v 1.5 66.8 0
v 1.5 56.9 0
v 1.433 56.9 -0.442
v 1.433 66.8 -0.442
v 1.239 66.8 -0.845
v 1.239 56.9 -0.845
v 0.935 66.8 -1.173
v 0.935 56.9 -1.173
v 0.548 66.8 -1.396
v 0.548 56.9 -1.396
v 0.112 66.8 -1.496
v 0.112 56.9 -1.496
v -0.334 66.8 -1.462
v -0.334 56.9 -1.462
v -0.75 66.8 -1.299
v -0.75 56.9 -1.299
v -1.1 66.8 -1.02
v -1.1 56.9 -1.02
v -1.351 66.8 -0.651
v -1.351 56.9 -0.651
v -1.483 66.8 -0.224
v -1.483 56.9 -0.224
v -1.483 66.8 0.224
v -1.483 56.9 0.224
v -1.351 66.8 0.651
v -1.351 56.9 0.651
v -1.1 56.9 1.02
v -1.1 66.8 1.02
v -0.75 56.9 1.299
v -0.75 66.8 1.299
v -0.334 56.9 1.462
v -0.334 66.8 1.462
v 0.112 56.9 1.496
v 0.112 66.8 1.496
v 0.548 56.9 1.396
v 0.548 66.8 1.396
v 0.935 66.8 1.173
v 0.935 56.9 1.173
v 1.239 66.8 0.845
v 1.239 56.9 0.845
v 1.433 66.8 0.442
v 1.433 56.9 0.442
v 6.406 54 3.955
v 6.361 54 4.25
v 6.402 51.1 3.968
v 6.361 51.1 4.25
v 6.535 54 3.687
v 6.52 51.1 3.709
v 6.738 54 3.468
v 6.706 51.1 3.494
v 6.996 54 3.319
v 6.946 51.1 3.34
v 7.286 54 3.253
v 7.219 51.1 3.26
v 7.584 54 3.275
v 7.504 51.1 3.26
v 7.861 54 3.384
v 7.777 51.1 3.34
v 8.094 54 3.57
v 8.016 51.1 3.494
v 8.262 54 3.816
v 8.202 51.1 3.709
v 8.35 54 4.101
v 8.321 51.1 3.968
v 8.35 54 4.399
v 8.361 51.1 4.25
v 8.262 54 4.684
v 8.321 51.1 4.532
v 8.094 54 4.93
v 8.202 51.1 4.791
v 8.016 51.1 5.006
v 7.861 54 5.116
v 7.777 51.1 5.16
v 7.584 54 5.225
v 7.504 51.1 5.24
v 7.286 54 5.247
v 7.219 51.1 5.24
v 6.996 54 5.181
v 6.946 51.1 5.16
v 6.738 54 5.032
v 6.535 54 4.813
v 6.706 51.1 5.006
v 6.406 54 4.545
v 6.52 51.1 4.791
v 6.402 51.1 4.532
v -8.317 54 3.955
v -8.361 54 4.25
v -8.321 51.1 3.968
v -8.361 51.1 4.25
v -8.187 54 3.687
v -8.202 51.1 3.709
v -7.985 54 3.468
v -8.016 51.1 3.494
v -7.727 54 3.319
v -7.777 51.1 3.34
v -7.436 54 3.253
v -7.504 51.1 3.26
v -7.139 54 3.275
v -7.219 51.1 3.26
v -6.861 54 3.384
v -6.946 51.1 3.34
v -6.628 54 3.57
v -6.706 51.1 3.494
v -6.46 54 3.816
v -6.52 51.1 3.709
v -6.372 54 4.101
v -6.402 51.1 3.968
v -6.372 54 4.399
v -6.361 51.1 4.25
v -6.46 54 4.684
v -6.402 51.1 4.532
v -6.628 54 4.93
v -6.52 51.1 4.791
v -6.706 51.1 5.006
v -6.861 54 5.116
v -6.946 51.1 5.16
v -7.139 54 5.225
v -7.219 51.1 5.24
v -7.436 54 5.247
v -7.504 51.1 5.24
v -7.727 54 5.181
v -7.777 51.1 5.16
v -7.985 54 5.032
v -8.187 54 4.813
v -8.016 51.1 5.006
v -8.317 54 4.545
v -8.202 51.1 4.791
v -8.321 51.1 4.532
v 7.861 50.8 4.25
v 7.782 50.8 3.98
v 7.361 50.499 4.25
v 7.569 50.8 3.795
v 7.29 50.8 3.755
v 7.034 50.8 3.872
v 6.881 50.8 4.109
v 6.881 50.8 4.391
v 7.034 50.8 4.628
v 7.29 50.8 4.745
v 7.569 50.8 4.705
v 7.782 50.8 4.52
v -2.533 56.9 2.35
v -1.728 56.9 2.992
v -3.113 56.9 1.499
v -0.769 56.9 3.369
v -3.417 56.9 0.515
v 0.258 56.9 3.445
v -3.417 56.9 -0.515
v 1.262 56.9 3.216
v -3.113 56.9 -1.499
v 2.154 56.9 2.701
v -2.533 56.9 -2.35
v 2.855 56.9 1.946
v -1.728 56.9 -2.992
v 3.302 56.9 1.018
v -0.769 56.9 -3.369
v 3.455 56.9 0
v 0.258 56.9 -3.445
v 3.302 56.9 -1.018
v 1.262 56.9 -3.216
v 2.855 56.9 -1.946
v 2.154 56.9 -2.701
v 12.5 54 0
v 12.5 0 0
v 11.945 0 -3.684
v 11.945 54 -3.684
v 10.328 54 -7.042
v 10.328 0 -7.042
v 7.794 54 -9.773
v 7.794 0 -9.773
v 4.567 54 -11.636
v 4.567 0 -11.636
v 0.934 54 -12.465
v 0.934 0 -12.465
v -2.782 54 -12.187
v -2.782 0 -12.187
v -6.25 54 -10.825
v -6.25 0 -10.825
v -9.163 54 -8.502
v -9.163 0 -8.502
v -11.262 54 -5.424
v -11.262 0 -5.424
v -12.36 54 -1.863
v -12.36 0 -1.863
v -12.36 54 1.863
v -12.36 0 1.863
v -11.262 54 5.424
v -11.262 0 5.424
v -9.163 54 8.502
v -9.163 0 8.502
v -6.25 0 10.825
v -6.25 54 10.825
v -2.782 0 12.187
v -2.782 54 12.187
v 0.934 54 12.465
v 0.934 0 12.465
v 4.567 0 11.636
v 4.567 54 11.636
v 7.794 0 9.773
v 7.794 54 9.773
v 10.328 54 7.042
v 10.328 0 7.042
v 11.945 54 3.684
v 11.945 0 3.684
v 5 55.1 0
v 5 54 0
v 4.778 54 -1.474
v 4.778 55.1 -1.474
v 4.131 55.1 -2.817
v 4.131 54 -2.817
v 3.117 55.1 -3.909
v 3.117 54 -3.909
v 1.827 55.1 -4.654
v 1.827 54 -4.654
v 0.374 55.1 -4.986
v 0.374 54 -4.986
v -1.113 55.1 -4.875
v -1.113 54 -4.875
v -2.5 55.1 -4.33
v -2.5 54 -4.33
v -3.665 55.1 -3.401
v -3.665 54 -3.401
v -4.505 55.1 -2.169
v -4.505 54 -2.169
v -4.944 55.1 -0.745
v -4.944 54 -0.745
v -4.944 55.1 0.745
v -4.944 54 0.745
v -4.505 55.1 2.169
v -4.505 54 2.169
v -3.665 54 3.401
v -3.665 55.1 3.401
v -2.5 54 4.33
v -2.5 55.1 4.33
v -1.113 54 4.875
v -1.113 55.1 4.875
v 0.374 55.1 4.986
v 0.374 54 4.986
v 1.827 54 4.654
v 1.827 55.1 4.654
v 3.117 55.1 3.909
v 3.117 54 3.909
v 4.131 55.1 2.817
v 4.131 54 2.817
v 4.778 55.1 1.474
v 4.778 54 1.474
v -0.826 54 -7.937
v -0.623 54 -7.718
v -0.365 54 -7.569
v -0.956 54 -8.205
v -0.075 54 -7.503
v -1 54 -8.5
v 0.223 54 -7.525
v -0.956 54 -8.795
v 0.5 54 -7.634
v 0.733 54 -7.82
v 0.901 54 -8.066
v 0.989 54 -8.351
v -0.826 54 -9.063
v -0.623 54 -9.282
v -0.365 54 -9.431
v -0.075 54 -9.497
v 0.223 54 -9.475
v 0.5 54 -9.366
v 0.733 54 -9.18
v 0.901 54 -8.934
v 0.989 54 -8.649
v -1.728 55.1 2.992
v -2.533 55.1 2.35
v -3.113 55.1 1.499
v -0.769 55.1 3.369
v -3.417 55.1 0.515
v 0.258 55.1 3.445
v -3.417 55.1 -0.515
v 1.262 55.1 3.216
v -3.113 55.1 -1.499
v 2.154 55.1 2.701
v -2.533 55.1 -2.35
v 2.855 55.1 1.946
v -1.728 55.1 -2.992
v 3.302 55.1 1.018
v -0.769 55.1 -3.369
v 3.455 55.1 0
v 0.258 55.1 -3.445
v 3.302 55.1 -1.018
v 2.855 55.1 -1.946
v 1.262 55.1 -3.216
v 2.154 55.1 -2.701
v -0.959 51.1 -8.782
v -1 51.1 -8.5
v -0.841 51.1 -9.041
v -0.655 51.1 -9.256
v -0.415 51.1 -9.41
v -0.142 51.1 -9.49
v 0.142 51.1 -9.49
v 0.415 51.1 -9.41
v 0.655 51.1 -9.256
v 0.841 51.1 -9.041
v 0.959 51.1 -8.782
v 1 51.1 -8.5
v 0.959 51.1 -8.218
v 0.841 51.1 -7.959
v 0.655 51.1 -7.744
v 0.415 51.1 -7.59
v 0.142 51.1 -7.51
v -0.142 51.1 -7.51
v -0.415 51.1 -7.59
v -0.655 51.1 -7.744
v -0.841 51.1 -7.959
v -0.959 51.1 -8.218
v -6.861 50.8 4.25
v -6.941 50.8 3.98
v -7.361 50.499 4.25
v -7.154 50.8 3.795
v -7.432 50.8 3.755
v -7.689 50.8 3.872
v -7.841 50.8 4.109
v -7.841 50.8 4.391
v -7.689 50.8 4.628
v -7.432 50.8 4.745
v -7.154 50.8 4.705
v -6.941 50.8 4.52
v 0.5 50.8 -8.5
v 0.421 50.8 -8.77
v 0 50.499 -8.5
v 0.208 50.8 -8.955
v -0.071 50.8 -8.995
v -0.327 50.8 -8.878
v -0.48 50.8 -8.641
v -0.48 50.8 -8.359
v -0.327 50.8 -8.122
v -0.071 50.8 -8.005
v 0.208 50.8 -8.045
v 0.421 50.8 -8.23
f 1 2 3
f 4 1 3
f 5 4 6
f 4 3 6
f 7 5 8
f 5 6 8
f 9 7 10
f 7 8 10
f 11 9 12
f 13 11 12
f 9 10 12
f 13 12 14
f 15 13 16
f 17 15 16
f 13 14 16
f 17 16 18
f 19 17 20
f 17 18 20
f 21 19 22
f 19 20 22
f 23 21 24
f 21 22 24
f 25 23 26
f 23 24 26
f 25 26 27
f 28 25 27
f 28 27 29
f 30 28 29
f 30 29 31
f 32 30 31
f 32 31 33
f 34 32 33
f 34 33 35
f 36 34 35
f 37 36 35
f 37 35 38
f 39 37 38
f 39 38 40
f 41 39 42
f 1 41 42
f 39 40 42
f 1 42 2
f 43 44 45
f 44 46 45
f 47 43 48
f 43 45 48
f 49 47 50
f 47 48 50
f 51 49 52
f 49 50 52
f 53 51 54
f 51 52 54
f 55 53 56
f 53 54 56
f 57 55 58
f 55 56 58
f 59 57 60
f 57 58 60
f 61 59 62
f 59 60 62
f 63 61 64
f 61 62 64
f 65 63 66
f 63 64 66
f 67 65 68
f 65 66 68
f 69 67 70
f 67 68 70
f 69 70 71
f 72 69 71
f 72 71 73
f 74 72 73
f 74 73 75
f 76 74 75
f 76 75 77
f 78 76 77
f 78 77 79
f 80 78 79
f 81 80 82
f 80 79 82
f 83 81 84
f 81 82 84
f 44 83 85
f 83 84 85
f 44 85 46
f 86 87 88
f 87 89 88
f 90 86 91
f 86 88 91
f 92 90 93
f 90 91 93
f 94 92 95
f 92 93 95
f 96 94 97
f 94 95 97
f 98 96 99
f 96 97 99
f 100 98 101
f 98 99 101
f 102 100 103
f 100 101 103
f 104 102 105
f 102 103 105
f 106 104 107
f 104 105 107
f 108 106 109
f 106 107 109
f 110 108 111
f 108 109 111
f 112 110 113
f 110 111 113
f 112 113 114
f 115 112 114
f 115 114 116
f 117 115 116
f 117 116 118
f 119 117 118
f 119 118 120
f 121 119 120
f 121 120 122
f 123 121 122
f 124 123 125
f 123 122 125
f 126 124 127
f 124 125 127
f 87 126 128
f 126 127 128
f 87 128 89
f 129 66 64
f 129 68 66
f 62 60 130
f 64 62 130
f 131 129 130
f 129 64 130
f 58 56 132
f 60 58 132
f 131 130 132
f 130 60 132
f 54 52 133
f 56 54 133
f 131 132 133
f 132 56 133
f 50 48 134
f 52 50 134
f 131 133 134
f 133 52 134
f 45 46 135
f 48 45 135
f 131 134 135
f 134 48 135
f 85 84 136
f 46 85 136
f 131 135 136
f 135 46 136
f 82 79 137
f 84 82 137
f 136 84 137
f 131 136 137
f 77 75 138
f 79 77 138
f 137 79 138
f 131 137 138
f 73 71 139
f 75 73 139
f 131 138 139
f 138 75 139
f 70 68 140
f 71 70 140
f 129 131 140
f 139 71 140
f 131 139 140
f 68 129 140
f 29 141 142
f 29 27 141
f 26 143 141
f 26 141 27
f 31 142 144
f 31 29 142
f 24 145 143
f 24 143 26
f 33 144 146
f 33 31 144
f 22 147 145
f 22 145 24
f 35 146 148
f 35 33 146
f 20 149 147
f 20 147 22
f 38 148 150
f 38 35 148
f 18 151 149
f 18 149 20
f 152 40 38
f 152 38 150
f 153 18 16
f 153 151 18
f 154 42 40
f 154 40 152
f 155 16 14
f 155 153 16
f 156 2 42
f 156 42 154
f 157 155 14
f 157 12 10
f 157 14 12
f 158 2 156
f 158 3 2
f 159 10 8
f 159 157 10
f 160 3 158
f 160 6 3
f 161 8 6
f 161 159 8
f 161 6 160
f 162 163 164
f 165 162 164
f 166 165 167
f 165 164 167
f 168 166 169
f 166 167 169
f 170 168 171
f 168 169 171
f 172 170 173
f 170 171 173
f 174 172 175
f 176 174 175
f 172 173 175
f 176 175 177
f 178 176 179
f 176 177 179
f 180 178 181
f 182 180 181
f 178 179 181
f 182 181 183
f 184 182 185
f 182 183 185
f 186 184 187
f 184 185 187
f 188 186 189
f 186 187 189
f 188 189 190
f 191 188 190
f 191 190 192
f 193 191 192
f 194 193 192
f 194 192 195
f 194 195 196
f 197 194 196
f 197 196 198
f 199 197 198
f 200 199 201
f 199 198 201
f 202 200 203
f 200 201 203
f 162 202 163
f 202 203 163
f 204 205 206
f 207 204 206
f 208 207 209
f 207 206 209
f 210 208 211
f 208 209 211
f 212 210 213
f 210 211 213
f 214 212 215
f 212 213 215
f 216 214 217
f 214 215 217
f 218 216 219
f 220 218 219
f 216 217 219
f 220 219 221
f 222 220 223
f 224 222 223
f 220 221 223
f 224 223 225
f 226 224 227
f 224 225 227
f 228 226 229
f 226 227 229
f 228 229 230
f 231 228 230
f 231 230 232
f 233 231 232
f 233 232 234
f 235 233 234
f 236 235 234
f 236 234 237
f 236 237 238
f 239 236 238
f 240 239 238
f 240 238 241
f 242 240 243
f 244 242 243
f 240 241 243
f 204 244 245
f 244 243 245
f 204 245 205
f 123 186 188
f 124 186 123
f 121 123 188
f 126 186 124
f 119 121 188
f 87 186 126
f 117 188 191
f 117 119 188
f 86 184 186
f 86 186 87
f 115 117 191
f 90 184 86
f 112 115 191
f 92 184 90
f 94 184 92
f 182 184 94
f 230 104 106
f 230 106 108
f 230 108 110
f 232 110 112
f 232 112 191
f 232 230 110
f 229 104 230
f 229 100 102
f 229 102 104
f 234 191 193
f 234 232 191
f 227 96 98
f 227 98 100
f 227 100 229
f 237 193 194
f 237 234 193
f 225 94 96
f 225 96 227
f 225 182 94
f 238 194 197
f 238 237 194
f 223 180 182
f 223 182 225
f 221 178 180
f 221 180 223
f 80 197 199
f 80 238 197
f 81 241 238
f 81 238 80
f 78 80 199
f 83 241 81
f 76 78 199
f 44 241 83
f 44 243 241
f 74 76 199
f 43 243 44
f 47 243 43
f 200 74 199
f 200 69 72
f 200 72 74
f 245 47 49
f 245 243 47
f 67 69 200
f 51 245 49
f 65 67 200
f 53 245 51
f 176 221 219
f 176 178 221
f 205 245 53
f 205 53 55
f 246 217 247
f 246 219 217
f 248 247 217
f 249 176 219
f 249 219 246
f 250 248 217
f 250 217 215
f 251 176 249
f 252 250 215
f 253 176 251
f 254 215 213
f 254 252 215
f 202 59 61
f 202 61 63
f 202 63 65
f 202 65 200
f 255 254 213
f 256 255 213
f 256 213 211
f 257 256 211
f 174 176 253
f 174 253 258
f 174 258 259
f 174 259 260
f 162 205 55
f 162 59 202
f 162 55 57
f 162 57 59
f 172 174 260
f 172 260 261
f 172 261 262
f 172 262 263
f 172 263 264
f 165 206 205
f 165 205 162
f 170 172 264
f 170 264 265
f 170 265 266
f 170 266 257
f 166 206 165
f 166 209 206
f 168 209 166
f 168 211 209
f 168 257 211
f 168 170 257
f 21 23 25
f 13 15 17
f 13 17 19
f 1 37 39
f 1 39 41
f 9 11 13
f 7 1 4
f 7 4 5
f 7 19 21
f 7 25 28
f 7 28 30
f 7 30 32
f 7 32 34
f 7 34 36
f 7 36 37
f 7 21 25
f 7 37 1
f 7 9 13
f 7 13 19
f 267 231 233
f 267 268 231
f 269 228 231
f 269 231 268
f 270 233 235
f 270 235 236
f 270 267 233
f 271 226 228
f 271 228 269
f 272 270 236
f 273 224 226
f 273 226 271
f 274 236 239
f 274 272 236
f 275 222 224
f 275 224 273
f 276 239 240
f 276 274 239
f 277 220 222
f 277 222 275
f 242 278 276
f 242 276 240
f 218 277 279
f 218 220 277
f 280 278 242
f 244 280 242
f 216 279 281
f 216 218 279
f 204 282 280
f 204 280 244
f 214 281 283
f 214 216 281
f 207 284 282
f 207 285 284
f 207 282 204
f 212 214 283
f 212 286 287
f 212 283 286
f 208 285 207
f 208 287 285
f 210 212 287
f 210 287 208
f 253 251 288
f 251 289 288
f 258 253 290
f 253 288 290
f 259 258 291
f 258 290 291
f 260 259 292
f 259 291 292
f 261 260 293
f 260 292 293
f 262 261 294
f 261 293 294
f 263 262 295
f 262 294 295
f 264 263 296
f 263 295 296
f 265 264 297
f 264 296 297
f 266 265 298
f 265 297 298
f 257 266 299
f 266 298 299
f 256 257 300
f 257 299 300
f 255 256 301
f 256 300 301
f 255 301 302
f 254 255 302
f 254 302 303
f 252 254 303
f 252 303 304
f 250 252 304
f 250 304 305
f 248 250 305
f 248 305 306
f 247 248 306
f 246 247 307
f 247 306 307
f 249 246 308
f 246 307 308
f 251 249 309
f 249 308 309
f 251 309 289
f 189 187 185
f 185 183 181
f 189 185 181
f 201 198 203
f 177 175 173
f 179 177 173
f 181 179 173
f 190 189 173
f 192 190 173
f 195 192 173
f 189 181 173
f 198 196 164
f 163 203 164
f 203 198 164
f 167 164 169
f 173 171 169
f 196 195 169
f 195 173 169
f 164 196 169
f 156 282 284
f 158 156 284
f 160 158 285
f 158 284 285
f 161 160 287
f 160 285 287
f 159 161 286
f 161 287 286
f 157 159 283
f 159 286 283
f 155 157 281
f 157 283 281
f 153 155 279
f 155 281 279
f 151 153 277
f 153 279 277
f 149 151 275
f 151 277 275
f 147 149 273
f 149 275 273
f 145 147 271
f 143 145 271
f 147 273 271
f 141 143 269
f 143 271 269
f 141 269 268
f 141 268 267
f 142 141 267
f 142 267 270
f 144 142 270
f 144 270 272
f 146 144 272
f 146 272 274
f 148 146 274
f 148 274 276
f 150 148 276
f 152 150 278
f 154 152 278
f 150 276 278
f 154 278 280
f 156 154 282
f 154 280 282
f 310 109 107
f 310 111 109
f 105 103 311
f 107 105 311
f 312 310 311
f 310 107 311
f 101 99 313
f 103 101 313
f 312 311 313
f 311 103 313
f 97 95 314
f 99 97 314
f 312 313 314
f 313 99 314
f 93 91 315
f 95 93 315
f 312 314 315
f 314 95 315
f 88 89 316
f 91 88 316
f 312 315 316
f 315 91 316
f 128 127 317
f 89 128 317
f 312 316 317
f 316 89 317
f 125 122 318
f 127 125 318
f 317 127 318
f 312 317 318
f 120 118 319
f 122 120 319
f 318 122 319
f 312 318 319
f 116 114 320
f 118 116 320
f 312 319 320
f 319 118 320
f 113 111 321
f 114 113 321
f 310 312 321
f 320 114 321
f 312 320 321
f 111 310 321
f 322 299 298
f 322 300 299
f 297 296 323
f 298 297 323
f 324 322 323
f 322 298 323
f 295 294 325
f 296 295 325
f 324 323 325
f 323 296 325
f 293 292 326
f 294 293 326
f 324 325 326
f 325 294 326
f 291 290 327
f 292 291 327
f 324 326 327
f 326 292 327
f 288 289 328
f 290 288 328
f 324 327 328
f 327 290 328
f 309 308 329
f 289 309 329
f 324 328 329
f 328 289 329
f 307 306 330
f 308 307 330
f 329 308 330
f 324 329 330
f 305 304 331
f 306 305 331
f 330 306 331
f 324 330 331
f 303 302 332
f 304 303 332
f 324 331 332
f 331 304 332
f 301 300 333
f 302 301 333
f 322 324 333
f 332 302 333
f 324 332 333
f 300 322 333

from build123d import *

# Parameters (mm, degrees)
SKETCH1_R                 = 12.5
BOSS_EXTRUDE1_DEPTH       = 54
SKETCH2_R                 = 5
BOSS_EXTRUDE2_DEPTH       = 1.1
SKETCH3_R                 = 3.455150035
BOSS_EXTRUDE3_DEPTH       = 1.8
SKETCH4_R                 = 1.5
BOSS_EXTRUDE4_DEPTH       = 9.9
F_2_0MM_DOWEL_HOLE1_D     = 2
F_2_0MM_DOWEL_HOLE1_DEPTH = 2.8999942
F_2_0MM_DOWEL_HOLE1_TIP   = 0.600860619


with BuildPart() as part:
    # Sketch1 → Boss-Extrude1 (new body)
    with BuildSketch(Plane(origin=(0, 0, 0), x_dir=(1, 0, 0), z_dir=(0, 1, 0))):
        Circle(SKETCH1_R)
    extrude(amount=BOSS_EXTRUDE1_DEPTH)

    # Sketch2 → Boss-Extrude2 (add)
    with BuildSketch(Plane(origin=(0, 54, 0), x_dir=(1, 0, 0), z_dir=(0, 1, 0))):
        Circle(SKETCH2_R)
    extrude(amount=BOSS_EXTRUDE2_DEPTH)

    # Sketch3 → Boss-Extrude3 (add)
    with BuildSketch(Plane(origin=(0, 55.1, 0), x_dir=(1, 0, 0), z_dir=(0, 1, 0))):
        Circle(SKETCH3_R)
    extrude(amount=BOSS_EXTRUDE3_DEPTH)

    # Sketch4 → Boss-Extrude4 (add)
    with BuildSketch(Plane(origin=(0, 56.9, 0), x_dir=(1, 0, 0), z_dir=(0, 1, 0))):
        Circle(SKETCH4_R)
    extrude(amount=BOSS_EXTRUDE4_DEPTH)

    # Ø2.0mm Dowel Hole1
    with Locations(Plane(origin=(0, 54, 0), x_dir=(1, 0, 0), z_dir=(0, 1, 0))):
        with Locations((-7.361215932, -4.25), (0, 8.5), (7.361215932, -4.25)):
            Hole(F_2_0MM_DOWEL_HOLE1_D / 2, depth=F_2_0MM_DOWEL_HOLE1_DEPTH)
            with Locations((0, 0, -(F_2_0MM_DOWEL_HOLE1_DEPTH + F_2_0MM_DOWEL_HOLE1_TIP / 2))):  # 118° drill point
                Cone(0, F_2_0MM_DOWEL_HOLE1_D / 2, F_2_0MM_DOWEL_HOLE1_TIP, mode=Mode.SUBTRACT)


solid = part.part
